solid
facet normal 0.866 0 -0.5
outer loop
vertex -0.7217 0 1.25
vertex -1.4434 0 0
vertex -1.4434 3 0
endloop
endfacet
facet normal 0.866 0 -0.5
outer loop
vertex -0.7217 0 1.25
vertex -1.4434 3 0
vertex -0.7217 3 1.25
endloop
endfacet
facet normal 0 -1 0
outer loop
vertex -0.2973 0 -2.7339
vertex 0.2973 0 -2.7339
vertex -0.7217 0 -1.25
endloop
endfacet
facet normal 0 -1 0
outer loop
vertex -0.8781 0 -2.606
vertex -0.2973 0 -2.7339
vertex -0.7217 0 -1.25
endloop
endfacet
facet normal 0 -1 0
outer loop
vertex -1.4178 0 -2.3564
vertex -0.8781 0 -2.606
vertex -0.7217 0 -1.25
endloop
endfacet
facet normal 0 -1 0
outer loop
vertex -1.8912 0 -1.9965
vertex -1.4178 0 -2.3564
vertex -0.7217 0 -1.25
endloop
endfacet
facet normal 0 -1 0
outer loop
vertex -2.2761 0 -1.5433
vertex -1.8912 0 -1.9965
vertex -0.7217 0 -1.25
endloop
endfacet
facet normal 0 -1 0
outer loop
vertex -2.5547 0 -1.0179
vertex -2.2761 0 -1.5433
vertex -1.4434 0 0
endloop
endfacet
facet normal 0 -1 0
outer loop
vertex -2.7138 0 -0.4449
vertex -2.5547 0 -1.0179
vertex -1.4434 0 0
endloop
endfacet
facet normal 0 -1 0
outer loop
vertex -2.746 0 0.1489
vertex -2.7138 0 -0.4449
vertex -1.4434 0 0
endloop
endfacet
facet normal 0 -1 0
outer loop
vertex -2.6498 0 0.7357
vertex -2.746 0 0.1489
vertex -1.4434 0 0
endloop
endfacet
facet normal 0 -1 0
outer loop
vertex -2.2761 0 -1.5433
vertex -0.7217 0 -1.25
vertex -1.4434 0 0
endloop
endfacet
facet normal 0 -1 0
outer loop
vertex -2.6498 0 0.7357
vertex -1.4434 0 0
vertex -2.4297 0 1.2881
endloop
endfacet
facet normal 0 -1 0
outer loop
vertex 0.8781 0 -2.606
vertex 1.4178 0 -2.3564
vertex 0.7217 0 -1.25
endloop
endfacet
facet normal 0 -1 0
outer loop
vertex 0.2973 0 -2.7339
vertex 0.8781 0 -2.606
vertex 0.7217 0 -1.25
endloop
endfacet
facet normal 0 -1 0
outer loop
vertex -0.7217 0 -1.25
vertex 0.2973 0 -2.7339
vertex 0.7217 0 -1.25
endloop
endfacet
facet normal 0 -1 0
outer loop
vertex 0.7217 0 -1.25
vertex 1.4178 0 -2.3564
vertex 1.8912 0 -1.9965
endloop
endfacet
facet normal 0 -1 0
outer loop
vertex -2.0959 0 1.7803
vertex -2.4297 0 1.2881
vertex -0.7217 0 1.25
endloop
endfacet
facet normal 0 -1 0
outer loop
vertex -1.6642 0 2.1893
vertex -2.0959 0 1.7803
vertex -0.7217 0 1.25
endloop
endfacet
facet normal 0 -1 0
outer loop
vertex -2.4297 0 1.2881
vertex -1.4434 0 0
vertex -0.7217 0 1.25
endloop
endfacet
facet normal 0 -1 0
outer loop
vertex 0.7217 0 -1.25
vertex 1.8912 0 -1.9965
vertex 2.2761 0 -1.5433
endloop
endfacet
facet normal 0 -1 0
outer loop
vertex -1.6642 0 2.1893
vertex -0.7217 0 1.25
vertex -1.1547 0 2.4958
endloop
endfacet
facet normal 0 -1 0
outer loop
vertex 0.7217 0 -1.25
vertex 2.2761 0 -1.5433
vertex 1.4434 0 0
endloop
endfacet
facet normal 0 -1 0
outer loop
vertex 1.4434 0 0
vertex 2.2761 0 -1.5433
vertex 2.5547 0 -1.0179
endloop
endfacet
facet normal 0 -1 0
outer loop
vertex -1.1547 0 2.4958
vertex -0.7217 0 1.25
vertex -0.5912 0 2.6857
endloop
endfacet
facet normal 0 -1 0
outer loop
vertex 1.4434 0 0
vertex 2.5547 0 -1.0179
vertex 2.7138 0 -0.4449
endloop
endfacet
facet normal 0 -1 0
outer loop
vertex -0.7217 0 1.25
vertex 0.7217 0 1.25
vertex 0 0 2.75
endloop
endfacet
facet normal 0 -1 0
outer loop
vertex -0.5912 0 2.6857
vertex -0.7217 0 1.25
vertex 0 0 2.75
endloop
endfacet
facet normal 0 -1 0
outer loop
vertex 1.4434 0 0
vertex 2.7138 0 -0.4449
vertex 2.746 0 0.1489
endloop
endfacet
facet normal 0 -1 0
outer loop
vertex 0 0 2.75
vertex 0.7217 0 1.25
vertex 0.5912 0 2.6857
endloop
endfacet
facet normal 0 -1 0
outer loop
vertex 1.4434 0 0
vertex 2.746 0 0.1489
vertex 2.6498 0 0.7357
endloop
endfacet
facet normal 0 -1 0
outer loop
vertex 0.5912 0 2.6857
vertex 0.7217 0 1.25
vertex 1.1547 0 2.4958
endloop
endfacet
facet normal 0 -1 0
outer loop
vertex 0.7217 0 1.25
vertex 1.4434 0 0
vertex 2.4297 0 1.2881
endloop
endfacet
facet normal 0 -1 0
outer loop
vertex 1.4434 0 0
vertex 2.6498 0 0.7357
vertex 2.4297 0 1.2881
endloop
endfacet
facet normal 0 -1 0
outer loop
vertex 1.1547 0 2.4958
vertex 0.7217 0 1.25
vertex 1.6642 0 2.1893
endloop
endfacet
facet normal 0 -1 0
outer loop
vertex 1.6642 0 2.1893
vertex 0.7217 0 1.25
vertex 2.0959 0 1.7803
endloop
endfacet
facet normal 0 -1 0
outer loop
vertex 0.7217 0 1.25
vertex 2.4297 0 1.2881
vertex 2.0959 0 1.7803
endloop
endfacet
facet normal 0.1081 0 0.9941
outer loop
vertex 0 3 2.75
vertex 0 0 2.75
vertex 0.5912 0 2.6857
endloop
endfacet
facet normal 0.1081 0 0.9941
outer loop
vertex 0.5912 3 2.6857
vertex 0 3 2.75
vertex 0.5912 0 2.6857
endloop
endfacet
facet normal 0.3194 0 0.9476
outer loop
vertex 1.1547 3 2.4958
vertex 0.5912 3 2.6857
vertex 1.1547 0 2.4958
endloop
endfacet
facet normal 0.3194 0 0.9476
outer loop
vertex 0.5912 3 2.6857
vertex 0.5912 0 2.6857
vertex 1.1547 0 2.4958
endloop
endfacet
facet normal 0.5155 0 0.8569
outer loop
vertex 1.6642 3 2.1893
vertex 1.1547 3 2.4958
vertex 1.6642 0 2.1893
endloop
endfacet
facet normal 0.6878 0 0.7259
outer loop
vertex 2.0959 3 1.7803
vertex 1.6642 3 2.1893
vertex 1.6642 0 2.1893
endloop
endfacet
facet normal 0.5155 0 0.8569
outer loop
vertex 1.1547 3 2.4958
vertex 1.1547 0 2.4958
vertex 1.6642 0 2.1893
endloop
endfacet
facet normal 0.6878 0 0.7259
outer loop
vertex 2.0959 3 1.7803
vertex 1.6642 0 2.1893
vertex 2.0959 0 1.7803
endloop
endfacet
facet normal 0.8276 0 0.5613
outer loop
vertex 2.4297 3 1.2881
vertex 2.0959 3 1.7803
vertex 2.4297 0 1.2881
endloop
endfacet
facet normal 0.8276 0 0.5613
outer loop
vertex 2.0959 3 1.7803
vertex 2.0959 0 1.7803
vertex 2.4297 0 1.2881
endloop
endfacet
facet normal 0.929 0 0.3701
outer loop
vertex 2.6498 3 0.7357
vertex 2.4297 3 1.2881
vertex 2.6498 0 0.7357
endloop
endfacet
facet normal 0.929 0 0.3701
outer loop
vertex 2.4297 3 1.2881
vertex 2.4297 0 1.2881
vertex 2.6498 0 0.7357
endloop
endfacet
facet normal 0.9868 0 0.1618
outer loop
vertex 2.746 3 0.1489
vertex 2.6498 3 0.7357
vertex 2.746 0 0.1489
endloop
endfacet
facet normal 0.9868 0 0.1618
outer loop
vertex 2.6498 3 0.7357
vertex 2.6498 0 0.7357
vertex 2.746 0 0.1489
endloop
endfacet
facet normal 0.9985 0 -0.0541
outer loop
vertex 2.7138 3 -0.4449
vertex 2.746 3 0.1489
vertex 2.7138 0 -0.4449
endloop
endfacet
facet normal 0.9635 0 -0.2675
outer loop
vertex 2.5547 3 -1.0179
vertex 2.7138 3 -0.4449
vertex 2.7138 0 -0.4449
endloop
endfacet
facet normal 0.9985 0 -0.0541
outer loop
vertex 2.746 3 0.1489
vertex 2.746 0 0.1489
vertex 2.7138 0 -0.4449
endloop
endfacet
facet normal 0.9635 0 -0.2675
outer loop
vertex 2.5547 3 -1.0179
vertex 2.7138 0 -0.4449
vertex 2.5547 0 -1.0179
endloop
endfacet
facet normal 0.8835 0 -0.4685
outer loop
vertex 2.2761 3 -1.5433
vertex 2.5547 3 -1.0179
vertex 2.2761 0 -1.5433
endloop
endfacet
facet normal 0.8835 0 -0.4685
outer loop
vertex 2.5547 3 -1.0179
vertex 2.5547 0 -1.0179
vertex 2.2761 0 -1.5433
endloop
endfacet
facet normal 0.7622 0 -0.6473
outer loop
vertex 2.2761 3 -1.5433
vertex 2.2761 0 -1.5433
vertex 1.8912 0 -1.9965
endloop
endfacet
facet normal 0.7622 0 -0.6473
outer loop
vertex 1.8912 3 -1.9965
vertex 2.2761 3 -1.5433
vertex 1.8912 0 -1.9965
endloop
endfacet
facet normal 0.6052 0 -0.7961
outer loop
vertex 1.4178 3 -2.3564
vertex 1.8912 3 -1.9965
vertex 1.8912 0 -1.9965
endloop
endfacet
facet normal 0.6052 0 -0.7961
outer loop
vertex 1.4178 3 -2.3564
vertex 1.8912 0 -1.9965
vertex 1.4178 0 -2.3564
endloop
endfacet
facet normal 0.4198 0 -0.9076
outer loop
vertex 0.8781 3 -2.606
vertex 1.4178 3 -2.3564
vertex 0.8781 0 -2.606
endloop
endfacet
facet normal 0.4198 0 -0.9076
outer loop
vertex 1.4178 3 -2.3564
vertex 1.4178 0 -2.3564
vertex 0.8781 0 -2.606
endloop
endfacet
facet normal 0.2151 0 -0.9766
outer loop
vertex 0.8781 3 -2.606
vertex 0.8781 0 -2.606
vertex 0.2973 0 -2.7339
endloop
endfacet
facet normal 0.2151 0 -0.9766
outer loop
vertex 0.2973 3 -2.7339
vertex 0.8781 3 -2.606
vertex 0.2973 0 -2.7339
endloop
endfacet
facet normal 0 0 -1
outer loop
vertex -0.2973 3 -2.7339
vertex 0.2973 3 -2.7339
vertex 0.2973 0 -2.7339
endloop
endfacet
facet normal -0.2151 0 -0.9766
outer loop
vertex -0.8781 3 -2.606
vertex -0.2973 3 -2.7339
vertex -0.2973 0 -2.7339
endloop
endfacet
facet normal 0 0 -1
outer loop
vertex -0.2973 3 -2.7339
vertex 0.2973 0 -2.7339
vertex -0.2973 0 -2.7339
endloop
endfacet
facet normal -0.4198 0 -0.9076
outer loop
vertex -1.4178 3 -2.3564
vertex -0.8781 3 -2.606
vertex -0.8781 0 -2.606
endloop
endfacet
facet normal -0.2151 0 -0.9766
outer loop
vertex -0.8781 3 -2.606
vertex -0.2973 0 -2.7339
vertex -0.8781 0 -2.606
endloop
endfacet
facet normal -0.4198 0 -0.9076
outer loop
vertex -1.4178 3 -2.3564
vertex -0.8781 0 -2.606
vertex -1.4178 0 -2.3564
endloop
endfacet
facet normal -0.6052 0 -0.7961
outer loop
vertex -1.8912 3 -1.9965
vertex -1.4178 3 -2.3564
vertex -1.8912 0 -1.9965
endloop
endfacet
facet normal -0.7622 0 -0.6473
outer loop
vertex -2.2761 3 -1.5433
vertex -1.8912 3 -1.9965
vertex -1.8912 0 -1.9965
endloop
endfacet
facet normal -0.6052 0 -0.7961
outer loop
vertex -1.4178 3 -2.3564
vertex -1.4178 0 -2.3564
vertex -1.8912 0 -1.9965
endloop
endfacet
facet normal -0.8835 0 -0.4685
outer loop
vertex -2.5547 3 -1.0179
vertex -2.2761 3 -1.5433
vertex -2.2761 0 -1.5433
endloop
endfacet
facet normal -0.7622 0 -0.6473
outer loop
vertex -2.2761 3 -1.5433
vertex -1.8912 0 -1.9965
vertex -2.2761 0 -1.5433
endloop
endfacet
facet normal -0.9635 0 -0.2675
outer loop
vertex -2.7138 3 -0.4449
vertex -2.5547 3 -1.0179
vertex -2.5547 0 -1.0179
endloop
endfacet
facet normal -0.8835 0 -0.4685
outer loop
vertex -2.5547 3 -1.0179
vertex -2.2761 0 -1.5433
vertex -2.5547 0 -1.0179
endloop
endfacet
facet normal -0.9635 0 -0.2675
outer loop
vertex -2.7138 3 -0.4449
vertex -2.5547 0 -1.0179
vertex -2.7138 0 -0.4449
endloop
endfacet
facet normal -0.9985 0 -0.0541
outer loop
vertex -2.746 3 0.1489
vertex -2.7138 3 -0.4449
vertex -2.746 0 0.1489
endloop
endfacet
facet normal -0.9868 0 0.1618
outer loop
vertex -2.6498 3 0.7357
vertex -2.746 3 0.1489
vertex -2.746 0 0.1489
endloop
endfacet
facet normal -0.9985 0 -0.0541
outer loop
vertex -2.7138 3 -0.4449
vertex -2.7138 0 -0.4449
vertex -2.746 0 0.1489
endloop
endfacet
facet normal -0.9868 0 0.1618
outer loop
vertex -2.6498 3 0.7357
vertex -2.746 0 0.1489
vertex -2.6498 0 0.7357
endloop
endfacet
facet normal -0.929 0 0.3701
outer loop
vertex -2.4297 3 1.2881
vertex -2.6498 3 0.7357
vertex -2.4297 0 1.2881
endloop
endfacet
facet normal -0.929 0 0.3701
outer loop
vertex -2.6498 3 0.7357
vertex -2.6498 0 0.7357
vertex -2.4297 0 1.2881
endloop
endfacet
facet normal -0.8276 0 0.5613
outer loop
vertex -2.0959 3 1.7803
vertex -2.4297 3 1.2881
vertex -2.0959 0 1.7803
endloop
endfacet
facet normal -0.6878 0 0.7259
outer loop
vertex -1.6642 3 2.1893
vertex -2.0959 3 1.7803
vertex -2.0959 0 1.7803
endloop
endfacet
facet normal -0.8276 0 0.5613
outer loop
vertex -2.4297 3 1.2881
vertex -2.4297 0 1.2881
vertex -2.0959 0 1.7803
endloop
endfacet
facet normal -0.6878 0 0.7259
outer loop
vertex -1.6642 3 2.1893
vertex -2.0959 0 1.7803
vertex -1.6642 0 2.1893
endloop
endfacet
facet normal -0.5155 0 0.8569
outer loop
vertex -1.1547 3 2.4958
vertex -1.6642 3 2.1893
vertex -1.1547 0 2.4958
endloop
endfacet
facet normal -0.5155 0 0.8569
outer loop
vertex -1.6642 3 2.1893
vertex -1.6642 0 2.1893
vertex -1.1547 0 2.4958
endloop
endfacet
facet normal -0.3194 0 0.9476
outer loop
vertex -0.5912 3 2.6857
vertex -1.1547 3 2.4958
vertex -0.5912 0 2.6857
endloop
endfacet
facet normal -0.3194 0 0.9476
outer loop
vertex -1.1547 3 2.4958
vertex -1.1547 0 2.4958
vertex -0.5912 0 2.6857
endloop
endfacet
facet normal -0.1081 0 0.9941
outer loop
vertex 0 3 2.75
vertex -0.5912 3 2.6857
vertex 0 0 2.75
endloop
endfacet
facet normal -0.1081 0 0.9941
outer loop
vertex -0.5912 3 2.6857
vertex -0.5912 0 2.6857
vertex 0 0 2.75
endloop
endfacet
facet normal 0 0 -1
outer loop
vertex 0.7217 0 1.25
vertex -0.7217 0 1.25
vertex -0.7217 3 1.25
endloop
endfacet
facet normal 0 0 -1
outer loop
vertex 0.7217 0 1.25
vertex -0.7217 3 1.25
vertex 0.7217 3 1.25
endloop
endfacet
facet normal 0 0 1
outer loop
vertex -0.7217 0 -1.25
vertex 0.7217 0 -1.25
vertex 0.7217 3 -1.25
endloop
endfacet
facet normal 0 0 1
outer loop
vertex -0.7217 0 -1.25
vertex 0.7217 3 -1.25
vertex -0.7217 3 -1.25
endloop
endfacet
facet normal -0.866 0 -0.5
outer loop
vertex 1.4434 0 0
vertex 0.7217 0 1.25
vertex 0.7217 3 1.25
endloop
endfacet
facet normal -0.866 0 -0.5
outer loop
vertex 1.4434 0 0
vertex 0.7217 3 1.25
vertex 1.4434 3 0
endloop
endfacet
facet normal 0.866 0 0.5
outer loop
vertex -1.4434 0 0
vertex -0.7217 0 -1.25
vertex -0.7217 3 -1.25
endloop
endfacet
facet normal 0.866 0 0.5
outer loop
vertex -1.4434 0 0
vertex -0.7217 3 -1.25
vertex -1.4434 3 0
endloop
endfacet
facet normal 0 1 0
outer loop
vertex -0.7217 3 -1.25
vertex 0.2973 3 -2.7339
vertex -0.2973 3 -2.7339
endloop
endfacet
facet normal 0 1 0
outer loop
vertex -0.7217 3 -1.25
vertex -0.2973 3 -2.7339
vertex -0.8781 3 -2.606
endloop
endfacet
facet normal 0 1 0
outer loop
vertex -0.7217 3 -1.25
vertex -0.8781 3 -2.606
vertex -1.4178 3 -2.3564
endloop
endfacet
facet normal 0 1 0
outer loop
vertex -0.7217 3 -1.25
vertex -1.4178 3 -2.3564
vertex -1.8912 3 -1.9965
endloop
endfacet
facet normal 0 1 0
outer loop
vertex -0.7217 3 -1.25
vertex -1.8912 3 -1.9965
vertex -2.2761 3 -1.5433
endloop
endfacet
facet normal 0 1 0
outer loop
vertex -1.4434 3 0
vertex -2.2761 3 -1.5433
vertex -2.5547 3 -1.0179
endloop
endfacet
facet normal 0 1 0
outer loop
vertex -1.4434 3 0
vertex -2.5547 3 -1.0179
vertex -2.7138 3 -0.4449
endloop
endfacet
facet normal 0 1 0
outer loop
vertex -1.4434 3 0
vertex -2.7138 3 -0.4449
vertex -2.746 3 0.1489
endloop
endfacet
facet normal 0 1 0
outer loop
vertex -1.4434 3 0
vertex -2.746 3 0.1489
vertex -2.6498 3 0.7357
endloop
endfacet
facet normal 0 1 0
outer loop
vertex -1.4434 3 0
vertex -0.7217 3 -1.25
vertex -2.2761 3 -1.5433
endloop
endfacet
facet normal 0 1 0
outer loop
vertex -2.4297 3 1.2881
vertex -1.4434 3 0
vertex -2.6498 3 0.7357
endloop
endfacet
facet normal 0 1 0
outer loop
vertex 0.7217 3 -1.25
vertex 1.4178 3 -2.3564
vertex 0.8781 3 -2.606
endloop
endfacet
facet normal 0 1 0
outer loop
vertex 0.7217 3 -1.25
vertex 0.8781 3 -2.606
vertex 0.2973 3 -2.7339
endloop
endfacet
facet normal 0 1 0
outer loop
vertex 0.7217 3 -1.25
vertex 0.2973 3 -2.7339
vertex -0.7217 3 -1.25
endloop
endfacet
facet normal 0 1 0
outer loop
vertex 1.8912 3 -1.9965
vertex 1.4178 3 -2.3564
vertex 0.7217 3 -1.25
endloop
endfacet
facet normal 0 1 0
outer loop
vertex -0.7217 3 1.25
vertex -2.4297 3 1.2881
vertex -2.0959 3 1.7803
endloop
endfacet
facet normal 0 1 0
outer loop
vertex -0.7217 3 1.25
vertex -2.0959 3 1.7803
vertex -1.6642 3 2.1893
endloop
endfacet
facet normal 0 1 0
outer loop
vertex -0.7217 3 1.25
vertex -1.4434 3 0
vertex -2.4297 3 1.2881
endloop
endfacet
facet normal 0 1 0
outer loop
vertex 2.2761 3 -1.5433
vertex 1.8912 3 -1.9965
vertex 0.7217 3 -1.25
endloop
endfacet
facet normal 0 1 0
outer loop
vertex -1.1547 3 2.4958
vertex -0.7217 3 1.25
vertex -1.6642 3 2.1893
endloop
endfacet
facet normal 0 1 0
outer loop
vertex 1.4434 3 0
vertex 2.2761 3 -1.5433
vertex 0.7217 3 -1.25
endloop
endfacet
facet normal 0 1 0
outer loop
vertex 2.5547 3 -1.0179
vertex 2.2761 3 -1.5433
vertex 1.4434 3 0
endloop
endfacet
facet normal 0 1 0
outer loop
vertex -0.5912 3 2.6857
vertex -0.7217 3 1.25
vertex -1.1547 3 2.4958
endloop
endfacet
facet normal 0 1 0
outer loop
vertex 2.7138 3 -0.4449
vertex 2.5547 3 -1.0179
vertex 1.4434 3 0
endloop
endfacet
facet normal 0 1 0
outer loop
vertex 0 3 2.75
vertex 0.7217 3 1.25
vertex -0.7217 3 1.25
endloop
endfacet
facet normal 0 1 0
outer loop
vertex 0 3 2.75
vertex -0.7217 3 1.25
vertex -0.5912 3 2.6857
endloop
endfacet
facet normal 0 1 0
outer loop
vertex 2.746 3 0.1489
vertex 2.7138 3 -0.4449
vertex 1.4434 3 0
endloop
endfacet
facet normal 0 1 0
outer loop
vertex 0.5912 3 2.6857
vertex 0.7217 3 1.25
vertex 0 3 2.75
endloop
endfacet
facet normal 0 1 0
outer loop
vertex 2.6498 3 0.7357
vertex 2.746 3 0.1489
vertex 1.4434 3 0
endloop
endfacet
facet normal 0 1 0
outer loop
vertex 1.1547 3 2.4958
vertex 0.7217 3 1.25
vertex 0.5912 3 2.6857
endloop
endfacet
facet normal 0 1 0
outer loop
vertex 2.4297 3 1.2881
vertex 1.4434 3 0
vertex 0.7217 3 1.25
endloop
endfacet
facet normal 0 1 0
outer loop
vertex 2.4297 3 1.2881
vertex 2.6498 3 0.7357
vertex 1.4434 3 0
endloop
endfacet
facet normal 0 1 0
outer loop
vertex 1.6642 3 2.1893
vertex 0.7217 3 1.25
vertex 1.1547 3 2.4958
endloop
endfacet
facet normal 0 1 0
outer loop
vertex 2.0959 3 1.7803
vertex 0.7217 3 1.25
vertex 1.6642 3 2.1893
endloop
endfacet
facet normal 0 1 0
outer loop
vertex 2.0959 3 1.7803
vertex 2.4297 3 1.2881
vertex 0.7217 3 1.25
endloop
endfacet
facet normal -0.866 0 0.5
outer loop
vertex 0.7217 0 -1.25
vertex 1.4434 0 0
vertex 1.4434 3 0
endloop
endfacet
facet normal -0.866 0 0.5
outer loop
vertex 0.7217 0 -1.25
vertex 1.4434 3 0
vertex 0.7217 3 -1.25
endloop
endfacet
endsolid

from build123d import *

# Parameters (mm, degrees)
SKETCH1_R           = 2.75
BOSS_EXTRUDE1_DEPTH = 3
BOSS_EXTRUDE2_DEPTH = 3
CUT_EXTRUDE3_DEPTH  = 3.981121947


with BuildPart() as part:
    # Sketch1 → Boss-Extrude1 (new body)
    with BuildSketch(Plane(origin=(0, 0, 0), x_dir=(1, 0, 0), z_dir=(0, 1, 0))):
        Circle(SKETCH1_R)
    extrude(amount=BOSS_EXTRUDE1_DEPTH)

    # Sketch2 → Boss-Extrude2 (add)
    with BuildSketch(Plane(origin=(0, 0, 0), x_dir=(1, 0, 0), z_dir=(0, 1, 0))):
        Polygon((0.721687836, 1.25), (-0.721687836, 1.25), (-1.443375673, 0), (-0.721687836, -1.25), (0.721687836, -1.25), (1.443375673, 0), align=None)
    extrude(amount=BOSS_EXTRUDE2_DEPTH)

    # Sketch2<2> → Cut-Extrude3 (cut)
    with BuildSketch(Plane(origin=(0, 0, 0), x_dir=(1, 0, 0), z_dir=(0, 1, 0))):
        Polygon((0.721687836, 1.25), (-0.721687836, 1.25), (-1.443375673, 0), (-0.721687836, -1.25), (0.721687836, -1.25), (1.443375673, 0), align=None)
    extrude(amount=CUT_EXTRUDE3_DEPTH, mode=Mode.SUBTRACT)


solid = part.part
